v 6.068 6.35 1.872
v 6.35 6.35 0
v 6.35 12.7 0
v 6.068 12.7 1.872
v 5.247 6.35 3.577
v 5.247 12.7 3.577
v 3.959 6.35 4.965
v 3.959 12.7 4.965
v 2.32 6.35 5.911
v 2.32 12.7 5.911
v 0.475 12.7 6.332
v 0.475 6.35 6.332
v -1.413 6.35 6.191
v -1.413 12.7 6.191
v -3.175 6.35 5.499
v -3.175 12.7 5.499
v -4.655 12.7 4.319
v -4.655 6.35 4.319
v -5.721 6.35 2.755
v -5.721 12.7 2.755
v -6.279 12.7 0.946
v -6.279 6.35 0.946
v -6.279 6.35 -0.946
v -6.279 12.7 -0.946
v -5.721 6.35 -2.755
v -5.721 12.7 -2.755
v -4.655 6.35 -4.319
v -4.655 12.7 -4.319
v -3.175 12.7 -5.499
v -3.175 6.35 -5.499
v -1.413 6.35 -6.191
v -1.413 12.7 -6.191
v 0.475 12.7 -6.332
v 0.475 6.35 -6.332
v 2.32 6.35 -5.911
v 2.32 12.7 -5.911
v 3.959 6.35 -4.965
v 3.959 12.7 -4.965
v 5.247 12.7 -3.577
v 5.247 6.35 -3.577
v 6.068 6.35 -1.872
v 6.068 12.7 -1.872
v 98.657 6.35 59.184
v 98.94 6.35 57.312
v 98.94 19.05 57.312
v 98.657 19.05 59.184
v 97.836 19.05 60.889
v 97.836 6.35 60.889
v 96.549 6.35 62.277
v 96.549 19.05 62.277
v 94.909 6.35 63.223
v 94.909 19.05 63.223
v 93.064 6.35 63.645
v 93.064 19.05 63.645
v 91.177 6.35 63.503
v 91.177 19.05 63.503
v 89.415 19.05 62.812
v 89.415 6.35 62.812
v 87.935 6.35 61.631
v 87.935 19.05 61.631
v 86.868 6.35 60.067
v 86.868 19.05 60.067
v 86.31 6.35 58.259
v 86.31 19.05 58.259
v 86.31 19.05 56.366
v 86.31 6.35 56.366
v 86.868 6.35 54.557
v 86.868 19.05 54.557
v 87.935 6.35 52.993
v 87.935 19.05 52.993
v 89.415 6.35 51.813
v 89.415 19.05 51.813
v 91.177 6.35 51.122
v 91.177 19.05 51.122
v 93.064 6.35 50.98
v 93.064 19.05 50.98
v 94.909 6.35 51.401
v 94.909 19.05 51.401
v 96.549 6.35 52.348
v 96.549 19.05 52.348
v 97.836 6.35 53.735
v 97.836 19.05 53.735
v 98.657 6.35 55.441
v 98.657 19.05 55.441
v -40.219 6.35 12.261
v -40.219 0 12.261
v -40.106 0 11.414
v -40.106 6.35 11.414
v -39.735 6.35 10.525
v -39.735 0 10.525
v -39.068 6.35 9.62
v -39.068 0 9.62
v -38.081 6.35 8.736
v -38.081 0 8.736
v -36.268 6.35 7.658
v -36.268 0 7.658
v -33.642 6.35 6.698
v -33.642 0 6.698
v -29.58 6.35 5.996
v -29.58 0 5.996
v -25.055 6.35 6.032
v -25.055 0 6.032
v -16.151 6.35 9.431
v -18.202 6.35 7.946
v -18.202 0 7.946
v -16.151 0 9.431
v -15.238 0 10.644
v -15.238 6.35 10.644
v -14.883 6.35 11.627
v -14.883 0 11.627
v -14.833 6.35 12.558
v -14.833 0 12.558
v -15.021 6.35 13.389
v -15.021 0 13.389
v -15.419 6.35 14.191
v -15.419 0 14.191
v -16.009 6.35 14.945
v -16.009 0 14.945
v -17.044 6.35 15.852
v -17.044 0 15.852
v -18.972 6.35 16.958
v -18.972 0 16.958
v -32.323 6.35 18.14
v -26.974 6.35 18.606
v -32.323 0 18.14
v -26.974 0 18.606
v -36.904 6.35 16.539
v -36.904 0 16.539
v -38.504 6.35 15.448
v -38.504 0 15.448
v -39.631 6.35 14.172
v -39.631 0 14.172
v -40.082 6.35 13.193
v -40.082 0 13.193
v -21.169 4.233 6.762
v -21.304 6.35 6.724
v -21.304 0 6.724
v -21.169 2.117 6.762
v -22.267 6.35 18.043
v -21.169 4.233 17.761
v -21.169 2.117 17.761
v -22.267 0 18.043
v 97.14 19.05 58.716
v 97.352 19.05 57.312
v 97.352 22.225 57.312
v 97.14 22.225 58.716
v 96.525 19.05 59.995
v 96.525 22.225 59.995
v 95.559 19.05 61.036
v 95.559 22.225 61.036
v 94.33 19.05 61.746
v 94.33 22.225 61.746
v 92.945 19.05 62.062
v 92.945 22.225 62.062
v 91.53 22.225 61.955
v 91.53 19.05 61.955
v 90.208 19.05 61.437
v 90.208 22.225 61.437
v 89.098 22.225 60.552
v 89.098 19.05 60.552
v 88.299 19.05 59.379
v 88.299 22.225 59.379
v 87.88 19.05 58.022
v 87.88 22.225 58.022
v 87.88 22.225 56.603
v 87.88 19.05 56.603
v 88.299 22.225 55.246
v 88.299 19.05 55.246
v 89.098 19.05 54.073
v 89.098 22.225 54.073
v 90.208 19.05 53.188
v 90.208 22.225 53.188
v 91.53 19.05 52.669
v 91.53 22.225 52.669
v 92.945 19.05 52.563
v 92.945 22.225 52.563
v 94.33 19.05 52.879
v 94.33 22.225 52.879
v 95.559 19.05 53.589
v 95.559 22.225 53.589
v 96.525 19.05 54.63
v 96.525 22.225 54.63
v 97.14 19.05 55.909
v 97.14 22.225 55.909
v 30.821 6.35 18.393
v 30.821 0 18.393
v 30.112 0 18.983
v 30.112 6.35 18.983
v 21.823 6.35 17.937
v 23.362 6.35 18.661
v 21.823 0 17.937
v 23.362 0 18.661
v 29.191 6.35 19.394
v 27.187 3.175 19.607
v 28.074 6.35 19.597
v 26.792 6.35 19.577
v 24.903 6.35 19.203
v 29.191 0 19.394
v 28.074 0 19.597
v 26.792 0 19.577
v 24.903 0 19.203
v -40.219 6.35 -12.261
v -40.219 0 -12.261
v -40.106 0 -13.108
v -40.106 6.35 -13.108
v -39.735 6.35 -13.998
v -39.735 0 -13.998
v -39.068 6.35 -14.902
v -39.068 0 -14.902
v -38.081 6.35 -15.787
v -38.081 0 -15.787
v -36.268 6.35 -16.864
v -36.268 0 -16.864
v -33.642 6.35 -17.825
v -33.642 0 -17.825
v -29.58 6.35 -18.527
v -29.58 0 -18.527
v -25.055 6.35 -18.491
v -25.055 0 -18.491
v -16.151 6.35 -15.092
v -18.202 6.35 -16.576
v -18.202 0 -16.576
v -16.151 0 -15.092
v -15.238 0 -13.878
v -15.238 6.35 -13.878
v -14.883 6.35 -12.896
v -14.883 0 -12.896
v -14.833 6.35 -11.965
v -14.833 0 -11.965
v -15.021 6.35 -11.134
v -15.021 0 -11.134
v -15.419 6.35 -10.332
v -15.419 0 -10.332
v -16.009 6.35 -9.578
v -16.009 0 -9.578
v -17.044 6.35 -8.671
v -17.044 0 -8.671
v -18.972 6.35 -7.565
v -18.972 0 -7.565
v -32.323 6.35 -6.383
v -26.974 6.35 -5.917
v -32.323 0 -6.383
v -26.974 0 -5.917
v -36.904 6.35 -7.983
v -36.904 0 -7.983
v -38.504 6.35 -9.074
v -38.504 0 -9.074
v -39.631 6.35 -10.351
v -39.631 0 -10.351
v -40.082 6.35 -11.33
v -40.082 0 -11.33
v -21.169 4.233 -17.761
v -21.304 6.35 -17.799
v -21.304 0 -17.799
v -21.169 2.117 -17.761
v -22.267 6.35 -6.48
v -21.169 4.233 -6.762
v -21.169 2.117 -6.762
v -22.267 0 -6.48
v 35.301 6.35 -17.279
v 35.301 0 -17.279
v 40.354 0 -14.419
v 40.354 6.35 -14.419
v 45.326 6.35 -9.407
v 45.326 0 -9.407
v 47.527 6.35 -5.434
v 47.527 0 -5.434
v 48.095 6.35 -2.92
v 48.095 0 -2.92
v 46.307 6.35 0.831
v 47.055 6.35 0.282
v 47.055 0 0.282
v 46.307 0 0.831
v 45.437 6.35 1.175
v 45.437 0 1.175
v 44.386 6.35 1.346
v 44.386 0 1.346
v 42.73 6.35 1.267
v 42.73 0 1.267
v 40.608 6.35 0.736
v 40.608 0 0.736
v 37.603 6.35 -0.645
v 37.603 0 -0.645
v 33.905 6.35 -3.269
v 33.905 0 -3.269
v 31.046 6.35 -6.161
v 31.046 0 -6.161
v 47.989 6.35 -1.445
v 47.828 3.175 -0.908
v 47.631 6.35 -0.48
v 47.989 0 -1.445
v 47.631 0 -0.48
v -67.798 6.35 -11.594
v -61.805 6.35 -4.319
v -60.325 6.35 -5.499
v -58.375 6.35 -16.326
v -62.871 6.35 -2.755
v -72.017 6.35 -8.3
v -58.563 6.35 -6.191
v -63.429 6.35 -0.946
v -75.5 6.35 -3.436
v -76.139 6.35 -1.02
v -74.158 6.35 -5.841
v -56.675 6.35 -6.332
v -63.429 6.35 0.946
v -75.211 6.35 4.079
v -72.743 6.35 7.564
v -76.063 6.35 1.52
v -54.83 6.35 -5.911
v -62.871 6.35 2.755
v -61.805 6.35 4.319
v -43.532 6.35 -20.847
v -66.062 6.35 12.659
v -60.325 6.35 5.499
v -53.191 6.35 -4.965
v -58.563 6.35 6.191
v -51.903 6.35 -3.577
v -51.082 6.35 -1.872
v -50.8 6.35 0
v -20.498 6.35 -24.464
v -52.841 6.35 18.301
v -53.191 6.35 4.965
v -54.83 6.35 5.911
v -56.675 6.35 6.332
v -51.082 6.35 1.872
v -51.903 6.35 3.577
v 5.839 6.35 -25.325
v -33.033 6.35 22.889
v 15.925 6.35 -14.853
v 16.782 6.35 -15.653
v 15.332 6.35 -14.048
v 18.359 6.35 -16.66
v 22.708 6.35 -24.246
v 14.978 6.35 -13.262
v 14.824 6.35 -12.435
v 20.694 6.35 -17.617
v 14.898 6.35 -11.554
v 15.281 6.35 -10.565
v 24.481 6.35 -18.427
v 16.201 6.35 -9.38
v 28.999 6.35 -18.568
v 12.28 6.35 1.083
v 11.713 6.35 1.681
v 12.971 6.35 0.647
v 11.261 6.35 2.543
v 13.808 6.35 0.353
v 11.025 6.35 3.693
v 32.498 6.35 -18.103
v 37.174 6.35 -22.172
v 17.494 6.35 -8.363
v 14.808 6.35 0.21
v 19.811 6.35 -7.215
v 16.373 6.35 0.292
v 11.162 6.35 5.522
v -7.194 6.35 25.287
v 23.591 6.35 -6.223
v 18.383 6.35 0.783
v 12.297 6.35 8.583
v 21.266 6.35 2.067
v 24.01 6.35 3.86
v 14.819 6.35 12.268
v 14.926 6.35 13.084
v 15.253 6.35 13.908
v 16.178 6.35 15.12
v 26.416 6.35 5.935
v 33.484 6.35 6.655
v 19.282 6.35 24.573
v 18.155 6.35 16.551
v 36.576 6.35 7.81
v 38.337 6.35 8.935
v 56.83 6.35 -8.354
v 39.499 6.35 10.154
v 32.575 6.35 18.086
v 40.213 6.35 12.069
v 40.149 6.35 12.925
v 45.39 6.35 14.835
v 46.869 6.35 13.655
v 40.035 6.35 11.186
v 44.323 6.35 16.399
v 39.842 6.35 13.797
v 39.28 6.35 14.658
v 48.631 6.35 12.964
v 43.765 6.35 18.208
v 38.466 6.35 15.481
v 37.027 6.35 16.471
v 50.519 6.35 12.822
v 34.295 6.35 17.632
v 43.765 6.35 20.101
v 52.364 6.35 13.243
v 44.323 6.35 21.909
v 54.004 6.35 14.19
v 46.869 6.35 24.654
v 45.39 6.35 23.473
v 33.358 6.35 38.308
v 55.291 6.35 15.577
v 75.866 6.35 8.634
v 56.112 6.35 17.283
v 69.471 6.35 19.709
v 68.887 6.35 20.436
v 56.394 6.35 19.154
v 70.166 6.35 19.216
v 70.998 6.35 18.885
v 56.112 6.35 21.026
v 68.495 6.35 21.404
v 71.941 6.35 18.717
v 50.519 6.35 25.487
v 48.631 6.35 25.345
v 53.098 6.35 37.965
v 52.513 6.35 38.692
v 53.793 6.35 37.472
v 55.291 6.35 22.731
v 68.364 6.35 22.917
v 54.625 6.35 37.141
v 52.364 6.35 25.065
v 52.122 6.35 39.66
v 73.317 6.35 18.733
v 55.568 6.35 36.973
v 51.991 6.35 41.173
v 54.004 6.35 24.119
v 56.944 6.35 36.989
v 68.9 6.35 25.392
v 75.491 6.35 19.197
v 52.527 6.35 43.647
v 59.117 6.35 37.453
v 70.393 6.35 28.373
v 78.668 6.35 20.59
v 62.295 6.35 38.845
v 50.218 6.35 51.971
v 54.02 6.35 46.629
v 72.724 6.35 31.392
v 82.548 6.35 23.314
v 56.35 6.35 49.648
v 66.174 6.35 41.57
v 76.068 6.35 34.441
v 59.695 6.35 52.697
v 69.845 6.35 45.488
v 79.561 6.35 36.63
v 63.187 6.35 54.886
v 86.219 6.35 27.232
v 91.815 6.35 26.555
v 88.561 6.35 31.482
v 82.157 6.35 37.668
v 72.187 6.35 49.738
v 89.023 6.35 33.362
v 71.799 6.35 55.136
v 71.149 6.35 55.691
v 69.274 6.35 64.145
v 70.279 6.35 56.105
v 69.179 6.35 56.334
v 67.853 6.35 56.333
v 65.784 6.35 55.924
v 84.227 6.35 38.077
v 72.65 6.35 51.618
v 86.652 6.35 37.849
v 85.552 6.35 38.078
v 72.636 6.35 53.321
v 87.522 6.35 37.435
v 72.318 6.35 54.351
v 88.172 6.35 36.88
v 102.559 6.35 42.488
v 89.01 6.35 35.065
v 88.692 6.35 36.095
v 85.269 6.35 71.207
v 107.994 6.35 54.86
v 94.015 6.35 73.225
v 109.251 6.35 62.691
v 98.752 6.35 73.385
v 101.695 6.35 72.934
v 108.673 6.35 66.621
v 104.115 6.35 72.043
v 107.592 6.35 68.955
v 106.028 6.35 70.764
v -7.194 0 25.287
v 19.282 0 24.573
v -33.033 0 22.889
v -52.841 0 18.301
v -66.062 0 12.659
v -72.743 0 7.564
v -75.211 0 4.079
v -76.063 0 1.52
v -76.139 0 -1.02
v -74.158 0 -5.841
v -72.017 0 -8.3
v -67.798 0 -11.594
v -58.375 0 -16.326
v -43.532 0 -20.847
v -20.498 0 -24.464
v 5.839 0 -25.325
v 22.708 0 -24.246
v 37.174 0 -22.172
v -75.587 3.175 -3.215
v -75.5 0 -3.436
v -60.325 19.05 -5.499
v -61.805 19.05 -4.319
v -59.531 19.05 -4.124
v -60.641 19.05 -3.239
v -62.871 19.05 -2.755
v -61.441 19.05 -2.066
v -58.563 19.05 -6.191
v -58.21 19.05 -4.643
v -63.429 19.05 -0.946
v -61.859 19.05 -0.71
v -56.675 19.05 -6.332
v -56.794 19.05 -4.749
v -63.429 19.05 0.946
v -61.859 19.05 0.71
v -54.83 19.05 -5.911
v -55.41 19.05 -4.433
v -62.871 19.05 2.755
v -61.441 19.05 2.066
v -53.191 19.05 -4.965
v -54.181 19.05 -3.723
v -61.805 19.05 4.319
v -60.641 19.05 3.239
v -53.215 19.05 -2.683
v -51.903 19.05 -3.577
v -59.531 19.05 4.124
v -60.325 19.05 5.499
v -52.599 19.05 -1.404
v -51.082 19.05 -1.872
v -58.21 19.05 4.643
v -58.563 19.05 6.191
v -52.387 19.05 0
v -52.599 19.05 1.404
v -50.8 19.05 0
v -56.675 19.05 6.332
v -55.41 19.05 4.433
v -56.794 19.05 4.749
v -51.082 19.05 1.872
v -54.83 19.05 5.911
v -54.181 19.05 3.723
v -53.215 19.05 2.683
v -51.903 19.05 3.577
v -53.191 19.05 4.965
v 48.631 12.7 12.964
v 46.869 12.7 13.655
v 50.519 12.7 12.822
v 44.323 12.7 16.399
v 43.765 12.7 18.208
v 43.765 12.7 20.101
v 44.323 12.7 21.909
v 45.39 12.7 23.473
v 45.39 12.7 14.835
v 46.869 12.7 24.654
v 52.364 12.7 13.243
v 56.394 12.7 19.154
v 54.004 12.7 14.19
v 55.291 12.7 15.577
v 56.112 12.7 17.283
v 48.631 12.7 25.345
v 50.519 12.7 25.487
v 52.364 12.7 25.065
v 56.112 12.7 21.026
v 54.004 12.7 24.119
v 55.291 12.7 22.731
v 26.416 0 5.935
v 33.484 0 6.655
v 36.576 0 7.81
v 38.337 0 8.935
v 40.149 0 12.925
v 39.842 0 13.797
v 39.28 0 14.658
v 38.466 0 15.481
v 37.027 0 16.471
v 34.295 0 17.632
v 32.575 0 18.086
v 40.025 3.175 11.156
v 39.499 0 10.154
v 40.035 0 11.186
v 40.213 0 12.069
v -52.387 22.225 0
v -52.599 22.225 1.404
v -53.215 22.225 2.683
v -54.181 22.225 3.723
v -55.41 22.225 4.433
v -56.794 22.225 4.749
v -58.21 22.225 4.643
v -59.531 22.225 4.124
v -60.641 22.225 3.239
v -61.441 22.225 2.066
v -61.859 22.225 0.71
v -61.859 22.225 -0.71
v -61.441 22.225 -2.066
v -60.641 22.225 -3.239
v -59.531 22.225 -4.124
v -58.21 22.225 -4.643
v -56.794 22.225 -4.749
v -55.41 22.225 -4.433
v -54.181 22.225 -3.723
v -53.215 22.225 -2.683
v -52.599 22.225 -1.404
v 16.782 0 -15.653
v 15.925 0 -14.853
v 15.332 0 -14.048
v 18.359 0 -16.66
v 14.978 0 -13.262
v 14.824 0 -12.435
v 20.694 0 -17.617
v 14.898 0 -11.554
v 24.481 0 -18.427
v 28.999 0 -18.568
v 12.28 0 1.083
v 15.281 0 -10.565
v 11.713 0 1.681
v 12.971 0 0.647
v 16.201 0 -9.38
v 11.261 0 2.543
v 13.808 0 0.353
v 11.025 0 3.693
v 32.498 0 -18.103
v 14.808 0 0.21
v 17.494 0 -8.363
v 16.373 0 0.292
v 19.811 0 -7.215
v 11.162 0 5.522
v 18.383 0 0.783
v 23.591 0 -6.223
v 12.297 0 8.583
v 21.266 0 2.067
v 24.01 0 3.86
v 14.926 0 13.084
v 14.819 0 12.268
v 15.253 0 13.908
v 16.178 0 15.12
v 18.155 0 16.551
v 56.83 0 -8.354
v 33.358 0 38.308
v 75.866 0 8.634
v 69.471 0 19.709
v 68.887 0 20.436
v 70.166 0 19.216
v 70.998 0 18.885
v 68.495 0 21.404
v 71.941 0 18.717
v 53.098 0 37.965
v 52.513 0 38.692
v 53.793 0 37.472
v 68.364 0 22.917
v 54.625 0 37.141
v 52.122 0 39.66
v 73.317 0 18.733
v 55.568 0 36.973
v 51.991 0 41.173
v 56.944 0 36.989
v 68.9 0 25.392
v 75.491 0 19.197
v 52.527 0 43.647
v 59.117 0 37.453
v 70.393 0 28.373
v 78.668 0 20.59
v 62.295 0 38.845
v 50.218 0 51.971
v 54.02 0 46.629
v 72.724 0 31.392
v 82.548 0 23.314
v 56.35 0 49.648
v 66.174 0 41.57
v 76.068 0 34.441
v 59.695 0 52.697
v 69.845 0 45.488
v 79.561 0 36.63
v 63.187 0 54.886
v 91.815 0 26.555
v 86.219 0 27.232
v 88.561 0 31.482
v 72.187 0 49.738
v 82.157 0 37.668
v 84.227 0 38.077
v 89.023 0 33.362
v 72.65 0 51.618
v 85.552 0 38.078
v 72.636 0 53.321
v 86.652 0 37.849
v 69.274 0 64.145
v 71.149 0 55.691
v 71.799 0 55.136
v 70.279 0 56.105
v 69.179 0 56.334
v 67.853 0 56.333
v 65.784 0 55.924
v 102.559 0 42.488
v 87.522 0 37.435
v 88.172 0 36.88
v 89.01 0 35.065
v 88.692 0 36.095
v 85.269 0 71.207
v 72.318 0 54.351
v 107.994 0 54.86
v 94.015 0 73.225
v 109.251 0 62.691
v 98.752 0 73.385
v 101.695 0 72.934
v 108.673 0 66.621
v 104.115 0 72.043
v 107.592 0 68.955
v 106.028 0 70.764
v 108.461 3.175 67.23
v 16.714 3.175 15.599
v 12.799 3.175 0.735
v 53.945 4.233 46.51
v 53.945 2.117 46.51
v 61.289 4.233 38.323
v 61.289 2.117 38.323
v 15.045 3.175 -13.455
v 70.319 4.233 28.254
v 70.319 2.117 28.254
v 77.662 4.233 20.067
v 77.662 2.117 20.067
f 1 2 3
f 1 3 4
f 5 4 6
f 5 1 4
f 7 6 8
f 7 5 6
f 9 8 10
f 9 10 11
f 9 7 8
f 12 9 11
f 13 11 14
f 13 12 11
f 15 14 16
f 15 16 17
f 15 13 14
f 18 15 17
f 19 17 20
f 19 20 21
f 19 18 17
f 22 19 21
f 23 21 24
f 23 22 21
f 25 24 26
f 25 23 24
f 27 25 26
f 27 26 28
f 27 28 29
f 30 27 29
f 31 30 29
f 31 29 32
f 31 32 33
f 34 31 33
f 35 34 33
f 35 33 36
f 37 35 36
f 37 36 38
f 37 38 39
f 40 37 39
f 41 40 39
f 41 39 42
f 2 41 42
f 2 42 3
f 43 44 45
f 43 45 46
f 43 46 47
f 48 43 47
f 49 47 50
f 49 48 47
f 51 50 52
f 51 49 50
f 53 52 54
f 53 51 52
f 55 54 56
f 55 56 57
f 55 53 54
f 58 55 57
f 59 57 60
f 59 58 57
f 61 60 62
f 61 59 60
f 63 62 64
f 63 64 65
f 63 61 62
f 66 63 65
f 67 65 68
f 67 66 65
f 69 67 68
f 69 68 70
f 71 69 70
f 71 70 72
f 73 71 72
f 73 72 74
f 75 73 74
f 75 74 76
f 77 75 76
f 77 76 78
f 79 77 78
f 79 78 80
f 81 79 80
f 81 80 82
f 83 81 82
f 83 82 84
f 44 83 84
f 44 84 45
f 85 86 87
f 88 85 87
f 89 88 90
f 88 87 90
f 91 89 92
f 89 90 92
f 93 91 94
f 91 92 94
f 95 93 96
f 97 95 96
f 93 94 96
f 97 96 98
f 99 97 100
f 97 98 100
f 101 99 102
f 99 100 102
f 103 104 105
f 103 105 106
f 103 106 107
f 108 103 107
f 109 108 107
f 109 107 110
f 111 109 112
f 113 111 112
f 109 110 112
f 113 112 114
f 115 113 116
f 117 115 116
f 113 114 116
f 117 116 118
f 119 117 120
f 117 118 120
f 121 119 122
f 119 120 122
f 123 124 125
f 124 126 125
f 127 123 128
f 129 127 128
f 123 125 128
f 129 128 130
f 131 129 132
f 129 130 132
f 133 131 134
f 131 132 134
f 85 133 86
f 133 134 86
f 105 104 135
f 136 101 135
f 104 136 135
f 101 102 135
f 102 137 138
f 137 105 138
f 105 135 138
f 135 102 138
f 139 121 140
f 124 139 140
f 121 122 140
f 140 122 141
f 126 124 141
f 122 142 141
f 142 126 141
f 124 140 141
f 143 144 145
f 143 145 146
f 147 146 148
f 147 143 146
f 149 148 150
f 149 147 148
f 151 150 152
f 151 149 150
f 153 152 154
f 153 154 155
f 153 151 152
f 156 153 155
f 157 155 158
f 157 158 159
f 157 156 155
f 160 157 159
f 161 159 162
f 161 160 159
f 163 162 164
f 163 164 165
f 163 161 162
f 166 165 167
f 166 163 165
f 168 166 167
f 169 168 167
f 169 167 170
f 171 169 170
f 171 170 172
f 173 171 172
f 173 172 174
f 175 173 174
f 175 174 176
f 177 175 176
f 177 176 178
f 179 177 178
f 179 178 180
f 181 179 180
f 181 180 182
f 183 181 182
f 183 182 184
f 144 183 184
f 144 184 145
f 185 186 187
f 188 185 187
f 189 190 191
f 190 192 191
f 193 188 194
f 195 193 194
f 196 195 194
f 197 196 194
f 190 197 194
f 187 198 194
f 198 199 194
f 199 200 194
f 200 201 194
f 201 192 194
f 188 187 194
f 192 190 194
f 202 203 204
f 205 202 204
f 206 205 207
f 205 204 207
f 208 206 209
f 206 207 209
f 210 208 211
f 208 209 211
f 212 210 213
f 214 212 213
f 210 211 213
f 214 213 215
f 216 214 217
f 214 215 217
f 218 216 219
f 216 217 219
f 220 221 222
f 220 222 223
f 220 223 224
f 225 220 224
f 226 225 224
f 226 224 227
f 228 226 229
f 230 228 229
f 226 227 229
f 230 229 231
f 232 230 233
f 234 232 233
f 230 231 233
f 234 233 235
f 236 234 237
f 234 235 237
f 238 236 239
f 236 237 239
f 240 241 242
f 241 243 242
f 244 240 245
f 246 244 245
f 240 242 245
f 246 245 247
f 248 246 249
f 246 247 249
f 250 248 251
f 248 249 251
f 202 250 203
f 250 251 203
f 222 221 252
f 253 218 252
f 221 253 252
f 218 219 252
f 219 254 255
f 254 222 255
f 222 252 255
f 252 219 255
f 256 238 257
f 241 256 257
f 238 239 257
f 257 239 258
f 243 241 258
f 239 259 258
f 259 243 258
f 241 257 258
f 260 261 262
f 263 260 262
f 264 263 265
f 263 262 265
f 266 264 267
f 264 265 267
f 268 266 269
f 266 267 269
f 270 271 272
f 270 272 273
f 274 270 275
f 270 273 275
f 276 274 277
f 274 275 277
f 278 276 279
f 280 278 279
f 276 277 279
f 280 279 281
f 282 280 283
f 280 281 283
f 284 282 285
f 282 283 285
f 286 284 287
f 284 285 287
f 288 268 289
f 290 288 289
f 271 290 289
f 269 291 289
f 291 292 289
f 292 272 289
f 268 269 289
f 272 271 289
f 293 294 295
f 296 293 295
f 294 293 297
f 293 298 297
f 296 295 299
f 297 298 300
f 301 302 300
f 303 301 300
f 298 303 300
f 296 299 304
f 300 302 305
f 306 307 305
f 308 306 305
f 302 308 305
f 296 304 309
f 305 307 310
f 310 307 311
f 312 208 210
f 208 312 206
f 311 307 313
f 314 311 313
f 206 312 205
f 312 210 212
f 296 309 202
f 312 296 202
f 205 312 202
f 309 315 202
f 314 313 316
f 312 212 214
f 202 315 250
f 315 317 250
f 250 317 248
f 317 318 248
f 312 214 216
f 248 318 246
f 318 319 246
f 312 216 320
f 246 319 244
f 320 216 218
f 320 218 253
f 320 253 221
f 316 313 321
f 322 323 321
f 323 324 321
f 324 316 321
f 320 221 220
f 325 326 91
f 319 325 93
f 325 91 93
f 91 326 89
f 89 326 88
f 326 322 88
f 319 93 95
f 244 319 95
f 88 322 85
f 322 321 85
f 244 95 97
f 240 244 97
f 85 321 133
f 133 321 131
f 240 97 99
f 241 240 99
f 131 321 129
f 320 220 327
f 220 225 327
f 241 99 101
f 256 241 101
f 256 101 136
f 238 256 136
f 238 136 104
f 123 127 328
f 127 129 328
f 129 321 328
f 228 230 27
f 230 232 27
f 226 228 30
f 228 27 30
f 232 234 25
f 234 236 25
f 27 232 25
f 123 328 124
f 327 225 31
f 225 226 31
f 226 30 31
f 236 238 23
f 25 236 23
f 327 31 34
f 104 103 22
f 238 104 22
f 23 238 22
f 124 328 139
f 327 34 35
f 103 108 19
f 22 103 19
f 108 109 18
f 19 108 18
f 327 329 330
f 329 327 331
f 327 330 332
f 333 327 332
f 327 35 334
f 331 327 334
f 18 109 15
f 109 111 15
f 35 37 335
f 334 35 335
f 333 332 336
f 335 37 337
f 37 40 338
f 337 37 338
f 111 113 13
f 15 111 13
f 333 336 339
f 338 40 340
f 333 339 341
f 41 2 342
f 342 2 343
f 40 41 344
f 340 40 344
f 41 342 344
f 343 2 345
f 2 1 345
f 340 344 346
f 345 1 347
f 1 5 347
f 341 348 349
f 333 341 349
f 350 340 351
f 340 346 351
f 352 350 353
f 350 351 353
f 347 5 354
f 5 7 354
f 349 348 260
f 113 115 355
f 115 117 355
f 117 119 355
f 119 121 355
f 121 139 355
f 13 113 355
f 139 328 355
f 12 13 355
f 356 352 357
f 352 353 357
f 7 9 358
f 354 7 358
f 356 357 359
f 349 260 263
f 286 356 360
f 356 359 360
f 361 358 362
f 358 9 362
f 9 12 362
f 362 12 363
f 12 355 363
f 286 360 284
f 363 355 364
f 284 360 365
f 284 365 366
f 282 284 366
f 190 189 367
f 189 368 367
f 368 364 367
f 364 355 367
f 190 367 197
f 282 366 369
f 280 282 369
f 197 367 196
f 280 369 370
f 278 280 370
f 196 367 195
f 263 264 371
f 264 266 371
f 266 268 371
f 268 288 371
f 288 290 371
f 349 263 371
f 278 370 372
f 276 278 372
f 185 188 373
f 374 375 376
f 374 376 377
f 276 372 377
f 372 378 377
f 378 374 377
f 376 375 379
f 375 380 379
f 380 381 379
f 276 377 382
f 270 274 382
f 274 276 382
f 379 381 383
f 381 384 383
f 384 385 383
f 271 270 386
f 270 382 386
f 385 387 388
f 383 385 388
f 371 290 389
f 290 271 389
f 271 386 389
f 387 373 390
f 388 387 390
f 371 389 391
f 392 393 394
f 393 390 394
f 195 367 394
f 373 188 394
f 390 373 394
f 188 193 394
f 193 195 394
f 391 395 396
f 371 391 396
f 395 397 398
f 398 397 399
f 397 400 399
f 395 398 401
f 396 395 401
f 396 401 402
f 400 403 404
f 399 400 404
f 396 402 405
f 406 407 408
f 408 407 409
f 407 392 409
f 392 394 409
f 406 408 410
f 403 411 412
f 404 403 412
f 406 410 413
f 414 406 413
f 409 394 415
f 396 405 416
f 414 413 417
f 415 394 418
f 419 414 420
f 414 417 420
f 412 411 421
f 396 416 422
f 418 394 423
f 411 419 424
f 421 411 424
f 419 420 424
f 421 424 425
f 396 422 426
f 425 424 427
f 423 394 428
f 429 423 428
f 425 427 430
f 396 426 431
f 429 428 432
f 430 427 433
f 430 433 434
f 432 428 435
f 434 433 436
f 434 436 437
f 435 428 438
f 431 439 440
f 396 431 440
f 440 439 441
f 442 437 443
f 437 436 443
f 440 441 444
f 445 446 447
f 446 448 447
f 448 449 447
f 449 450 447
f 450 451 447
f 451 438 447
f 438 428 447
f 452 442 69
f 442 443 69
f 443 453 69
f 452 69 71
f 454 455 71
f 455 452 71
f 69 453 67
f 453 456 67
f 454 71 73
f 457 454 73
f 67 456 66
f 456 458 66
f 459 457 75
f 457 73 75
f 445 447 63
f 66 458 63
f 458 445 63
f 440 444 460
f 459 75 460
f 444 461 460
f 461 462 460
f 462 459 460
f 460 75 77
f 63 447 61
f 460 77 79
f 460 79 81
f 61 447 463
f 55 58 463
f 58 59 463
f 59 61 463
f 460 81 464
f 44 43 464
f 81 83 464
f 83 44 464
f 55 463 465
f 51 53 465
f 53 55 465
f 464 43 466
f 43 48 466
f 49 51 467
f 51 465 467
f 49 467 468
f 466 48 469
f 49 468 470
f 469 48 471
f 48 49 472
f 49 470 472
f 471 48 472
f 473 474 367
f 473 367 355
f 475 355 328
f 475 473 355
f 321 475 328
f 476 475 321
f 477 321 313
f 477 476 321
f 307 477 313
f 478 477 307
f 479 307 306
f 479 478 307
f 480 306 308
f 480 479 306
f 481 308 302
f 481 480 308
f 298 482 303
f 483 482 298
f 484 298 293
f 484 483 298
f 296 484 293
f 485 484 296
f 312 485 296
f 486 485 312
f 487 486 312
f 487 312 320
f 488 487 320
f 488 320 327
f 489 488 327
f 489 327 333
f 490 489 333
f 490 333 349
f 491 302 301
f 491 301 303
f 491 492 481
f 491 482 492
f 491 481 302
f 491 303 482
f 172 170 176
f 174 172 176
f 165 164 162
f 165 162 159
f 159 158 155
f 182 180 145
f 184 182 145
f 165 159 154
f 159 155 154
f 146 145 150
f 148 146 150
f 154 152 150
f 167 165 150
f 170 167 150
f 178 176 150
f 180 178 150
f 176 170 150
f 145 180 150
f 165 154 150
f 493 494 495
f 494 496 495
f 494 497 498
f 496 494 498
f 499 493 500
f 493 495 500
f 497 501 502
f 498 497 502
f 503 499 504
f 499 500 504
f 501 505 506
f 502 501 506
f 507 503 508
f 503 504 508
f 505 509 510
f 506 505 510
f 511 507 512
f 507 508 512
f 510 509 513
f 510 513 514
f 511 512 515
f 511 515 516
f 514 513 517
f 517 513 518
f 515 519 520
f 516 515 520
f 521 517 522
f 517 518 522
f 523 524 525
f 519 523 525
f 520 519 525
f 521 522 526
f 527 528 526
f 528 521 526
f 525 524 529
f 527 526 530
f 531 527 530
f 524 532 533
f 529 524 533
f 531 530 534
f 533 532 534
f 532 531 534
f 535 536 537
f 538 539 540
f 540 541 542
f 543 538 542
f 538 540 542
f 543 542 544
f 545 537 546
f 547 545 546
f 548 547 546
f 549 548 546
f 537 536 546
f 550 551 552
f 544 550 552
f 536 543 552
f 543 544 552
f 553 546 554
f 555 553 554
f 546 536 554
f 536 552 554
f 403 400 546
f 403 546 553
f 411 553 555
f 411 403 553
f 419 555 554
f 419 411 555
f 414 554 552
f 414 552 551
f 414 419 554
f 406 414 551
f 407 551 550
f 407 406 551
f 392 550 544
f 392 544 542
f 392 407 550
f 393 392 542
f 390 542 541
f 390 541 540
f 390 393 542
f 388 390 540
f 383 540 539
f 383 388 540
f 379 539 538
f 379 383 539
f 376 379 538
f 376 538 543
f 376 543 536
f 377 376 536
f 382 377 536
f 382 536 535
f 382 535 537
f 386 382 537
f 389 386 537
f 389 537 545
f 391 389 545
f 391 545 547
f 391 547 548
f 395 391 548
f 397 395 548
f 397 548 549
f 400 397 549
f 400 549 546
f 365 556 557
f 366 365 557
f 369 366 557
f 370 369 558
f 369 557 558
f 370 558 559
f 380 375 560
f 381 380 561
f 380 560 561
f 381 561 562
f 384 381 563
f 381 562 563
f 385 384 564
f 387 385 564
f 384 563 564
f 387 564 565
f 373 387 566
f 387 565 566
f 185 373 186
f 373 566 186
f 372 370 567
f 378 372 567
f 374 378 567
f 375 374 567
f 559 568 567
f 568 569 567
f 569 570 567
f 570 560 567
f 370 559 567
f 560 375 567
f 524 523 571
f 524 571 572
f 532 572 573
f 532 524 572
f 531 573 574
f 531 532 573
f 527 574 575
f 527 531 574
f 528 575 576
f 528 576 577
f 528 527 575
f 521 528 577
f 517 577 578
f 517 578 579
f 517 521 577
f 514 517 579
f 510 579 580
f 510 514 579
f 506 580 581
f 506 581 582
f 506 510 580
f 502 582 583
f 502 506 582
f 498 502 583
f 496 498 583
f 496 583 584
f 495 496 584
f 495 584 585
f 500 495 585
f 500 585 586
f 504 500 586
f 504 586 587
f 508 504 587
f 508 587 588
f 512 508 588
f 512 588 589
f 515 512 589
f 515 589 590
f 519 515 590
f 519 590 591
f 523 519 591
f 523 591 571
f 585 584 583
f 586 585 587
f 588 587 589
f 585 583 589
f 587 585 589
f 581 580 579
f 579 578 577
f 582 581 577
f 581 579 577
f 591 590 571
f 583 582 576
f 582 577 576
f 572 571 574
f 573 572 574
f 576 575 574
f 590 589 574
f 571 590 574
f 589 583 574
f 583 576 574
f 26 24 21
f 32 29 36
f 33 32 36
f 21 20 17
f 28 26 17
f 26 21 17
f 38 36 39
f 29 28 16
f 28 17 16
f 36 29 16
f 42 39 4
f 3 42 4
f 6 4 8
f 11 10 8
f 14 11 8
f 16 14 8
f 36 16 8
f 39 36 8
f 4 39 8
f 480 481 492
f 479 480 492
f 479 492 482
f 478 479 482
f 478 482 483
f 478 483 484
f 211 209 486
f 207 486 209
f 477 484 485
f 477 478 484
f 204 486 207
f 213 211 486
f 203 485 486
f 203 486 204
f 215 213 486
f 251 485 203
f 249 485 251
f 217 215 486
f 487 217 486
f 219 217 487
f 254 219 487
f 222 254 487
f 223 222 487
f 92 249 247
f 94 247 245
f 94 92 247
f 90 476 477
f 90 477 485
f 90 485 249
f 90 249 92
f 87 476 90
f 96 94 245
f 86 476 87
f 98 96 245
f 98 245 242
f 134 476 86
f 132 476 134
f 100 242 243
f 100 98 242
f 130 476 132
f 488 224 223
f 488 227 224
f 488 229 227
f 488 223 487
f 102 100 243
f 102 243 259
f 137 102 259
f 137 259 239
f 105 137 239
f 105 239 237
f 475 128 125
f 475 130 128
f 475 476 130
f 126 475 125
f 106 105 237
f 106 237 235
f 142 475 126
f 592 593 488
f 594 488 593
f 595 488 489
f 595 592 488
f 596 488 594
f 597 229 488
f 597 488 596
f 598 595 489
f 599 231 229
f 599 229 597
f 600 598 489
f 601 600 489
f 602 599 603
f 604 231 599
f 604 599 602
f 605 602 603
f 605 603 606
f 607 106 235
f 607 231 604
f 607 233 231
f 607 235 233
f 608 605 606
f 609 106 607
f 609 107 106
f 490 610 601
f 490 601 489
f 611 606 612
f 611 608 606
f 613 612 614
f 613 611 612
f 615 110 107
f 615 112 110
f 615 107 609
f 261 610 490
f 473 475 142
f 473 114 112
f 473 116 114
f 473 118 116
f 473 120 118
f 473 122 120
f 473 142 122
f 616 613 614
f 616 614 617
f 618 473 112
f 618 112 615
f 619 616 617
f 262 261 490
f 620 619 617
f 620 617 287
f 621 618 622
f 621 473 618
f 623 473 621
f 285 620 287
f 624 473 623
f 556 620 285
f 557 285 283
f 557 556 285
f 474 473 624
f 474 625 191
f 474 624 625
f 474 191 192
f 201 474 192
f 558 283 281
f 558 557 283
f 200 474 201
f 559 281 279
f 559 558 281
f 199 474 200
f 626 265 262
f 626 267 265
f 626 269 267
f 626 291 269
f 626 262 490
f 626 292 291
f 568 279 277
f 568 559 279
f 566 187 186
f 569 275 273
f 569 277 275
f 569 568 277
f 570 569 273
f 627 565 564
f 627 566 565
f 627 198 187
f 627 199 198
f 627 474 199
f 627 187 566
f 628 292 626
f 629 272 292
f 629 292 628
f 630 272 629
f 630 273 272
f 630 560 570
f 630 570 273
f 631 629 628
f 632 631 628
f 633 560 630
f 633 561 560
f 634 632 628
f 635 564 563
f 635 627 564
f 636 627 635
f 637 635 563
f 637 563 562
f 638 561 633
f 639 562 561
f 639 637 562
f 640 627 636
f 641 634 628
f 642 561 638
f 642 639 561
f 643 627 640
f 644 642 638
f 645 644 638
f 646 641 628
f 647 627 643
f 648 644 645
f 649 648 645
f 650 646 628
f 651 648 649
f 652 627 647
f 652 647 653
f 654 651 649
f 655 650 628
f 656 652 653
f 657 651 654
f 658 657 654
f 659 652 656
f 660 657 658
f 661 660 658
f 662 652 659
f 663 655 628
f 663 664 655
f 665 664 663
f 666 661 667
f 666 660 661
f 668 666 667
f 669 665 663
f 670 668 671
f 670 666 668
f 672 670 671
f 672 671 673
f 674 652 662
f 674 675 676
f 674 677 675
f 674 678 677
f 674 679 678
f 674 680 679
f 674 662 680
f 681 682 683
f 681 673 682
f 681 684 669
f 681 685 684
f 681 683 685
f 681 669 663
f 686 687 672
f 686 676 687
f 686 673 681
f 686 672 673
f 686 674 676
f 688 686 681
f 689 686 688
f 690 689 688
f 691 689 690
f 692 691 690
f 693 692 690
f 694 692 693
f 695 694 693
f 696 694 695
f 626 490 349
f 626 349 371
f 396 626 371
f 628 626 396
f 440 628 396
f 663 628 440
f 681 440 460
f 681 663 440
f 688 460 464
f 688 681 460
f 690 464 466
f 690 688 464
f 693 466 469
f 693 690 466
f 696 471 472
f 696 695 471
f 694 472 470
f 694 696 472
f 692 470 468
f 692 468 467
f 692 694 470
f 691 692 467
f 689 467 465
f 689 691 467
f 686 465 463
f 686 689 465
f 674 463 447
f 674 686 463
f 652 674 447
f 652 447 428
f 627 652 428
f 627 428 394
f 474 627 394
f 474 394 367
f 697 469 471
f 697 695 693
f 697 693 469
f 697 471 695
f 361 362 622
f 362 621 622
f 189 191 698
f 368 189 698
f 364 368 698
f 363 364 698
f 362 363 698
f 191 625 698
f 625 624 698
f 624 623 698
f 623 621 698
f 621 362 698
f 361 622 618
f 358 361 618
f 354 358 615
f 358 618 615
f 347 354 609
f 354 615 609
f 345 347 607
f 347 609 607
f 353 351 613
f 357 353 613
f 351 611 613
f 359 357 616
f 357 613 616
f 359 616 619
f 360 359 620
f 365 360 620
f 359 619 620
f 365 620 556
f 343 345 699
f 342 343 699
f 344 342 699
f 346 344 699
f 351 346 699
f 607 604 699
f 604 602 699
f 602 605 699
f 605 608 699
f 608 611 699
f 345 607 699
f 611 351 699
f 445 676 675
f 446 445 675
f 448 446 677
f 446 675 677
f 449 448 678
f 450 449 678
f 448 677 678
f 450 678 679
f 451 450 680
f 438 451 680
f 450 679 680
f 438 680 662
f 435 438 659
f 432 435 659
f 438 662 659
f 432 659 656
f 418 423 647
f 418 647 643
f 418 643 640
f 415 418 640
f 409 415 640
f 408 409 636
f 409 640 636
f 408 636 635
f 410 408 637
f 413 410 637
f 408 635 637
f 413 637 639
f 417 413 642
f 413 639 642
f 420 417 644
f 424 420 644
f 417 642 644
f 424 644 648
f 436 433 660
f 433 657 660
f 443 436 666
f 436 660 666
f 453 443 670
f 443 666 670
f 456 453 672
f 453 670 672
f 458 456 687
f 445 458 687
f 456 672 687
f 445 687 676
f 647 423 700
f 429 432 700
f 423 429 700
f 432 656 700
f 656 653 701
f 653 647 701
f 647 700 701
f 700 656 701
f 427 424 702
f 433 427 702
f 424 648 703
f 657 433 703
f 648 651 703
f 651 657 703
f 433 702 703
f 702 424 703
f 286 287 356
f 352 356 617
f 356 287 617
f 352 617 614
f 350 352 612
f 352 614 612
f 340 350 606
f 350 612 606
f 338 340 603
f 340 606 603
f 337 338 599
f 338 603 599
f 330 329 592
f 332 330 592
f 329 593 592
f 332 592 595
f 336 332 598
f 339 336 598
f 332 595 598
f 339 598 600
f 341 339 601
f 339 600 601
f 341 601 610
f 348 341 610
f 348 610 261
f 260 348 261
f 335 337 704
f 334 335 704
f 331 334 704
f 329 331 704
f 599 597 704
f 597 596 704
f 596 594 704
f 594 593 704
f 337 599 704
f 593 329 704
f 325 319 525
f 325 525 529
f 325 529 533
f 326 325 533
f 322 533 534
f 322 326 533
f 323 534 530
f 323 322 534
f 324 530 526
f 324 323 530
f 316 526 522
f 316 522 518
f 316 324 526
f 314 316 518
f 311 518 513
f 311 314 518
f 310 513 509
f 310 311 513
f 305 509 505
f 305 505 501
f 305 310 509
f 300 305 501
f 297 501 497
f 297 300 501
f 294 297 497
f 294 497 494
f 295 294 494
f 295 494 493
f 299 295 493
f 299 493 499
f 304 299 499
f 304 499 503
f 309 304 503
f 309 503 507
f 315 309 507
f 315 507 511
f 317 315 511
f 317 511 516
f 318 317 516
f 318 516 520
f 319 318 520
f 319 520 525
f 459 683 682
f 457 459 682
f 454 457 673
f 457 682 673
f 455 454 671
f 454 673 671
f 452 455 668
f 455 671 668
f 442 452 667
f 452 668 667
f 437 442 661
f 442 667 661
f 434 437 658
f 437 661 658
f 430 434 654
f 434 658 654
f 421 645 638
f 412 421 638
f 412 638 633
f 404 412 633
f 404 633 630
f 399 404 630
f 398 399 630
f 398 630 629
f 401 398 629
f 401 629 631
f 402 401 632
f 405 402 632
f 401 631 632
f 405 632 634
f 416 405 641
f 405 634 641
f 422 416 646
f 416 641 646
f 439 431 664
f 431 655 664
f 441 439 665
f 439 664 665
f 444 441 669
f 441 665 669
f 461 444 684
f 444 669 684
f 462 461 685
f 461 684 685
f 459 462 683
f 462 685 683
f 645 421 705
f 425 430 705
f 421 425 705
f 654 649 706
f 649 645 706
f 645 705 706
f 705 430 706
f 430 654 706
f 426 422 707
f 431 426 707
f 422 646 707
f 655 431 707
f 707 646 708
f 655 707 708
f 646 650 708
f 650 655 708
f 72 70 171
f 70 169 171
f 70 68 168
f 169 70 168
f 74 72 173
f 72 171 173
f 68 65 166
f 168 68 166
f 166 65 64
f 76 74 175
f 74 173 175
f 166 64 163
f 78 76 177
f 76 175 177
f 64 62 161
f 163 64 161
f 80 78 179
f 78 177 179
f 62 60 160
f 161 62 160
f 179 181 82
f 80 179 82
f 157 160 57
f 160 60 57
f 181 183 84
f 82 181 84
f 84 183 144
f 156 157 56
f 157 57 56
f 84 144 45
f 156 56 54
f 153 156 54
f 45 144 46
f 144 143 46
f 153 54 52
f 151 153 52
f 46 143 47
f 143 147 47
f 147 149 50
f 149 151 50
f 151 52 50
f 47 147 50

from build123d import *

# Parameters (mm, degrees)
F0_R     = 6.35
F1_DEPTH = 6.35
F0_R_2   = 4.7625
F2_DEPTH = 19.05
F3_DEPTH = 19.05
F4_DEPTH = 12.7
F5_DEPTH = 12.7
F6_DEPTH = 22.225
F7_DEPTH = 22.225


with BuildPart() as f1:
    # F0 (on Front) → F1 (new body)
    with BuildSketch(Plane.XZ):
        with BuildLine():
            add(Edge.make_bspline(
                [(37.1742285347, -22.1723469736), (122.739519111, 29.9253006643), (108.4614492154, 67.2295257241), (94.1833793198, 104.5337507839), (19.2824834585, 24.5733049188)],
                knots=[1.0611703705, 1.0611703705, 1.0611703705, 3.0146959581, 3.0146959581, 4.9682215457, 4.9682215457, 4.9682215457], degree=2, weights=[1, 0.5597081146, 1, 0.5597081146, 1]))
            add(Edge.make_bspline(
                [(19.2824834585, 24.5733049188), (-89.8653771413, 34.0896923766), (-75.5873072457, -3.2145326832), (-61.3092373501, -40.518757743), (37.1742285347, -22.1723469736)],
                knots=[1.3149637615, 1.3149637615, 1.3149637615, 3.2684893491, 3.2684893491, 5.2220149367, 5.2220149367, 5.2220149367], degree=2, weights=[1, 0.5597081146, 1, 0.5597081146, 1]))
        make_face()
        with BuildLine():
            add(Edge.make_bspline(
                [(-40.2189802051, -12.2613835424), (-40.2189802051, -23.2599061705), (-21.1689802051, -17.7606448564), (-2.1189802051, -12.2613835424), (-21.1689802051, -6.7621222284), (-40.2189802051, -1.2628609144), (-40.2189802051, -12.2613835424)],
                knots=[0, 0, 0, 2.0943951024, 2.0943951024, 4.1887902048, 4.1887902048, 6.2831853072, 6.2831853072, 6.2831853072], degree=2, weights=[1, 0.5, 1, 0.5, 1, 0.5, 1]))
        make_face(mode=Mode.SUBTRACT)
        with Locations((-57.15, 0)):
            Circle(F0_R, mode=Mode.SUBTRACT)
        Circle(F0_R, mode=Mode.SUBTRACT)
        with BuildLine():
            add(Edge.make_bspline(
                [(-40.2189802051, 12.2613835424), (-40.2189802051, 1.2628609144), (-21.1689802051, 6.7621222284), (-2.1189802051, 12.2613835424), (-21.1689802051, 17.7606448564), (-40.2189802051, 23.2599061705), (-40.2189802051, 12.2613835424)],
                knots=[0, 0, 0, 2.0943951024, 2.0943951024, 4.1887902048, 4.1887902048, 6.2831853072, 6.2831853072, 6.2831853072], degree=2, weights=[1, 0.5, 1, 0.5, 1, 0.5, 1]))
        make_face(mode=Mode.SUBTRACT)
        with BuildLine():
            add(Edge.make_bspline(
                [(31.0460055984, -6.1611767452), (11.1531172526, -3.285752818), (15.0453420721, -13.4549445722), (18.9375668916, -23.6241363265), (35.3014766673, -17.2794197324)],
                knots=[1.2893779229, 1.2893779229, 1.2893779229, 3.3306797762, 3.3306797762, 5.3719816294, 5.3719816294, 5.3719816294], degree=2, weights=[1, 0.5228111806, 1, 0.5228111806, 1]))
            add(Edge.make_bspline(
                [(35.3014766673, -17.2794197324), (51.7197916302, -11.0768472352), (47.8275668108, -0.9076554809), (43.9353419913, 9.2615362733), (31.0460055984, -6.1611767452)],
                knots=[0.9112036777, 0.9112036777, 0.9112036777, 2.952505531, 2.952505531, 4.9938073843, 4.9938073843, 4.9938073843], degree=2, weights=[1, 0.5228111806, 1, 0.5228111806, 1]))
        make_face(mode=Mode.SUBTRACT)
        with BuildLine():
            add(Edge.make_bspline(
                [(26.4160908045, 5.9353730506), (38.0004613393, 5.4304624323), (40.0250130574, 11.155813294), (42.0495647755, 16.8811641557), (30.8212418268, 18.3929630327)],
                knots=[4.6254377708, 4.6254377708, 4.6254377708, 6.108187934, 6.108187934, 7.5909380972, 7.5909380972, 7.5909380972], degree=2, weights=[1, 0.73754066, 1, 0.73754066, 1]))
            add(Edge.make_bspline(
                [(14.8189874208, 12.2681525982), (7.4694947115, 3.6457556577), (12.7993768112, 0.7352902393), (18.1292589109, -2.1751751792), (26.4160908045, 5.9353730506)],
                knots=[4.9754325172, 4.9754325172, 4.9754325172, 6.4581826804, 6.4581826804, 7.9409328436, 7.9409328436, 7.9409328436], degree=2, weights=[1, 0.73754066, 1, 0.73754066, 1]))
            add(Edge.make_bspline(
                [(21.8225865676, 17.9367932089), (14.827330656, 16.1815132551), (14.8189874208, 12.2681525982)],
                knots=[2.0359217815, 2.0359217815, 2.0359217815, 3.1405266603, 3.1405266603, 3.1405266603], degree=2, weights=[1, 0.8513188077, 1]))
            add(Edge.make_bspline(
                [(30.8212418268, 18.3929630327), (28.2021525278, 21.3006824972), (21.8225865676, 17.9367932089)],
                knots=[3.1426586468, 3.1426586468, 3.1426586468, 4.2472635256, 4.2472635256, 4.2472635256], degree=2, weights=[1, 0.8513188077, 1]))
        make_face(mode=Mode.SUBTRACT)
        with Locations((50.0444119496, 19.154334678)):
            Circle(F0_R, mode=Mode.SUBTRACT)
        with BuildLine():
            add(Edge.make_bspline(
                [(71.7986181301, 55.1357522232), (64.4551089206, 63.3235707661), (53.945145806, 46.510330438), (43.4351826914, 29.6970901099), (61.2886550155, 38.3225118952), (79.1421273396, 46.9479336804), (71.7986181301, 55.1357522232)],
                knots=[0, 0, 0, 2.0943951024, 2.0943951024, 4.1887902048, 4.1887902048, 6.2831853072, 6.2831853072, 6.2831853072], degree=2, weights=[1, 0.5, 1, 0.5, 1, 0.5, 1]))
        make_face(mode=Mode.SUBTRACT)
        with BuildLine():
            add(Edge.make_bspline(
                [(88.1720140869, 36.8798487852), (80.8285048775, 45.0676673281), (70.3185417629, 28.254427), (59.8085786482, 11.4411866719), (77.6620509723, 20.0666084571), (95.5155232964, 28.6920302424), (88.1720140869, 36.8798487852)],
                knots=[0, 0, 0, 2.0943951024, 2.0943951024, 4.1887902048, 4.1887902048, 6.2831853072, 6.2831853072, 6.2831853072], degree=2, weights=[1, 0.5, 1, 0.5, 1, 0.5, 1]))
        make_face(mode=Mode.SUBTRACT)
        with Locations((92.5895651076, 57.312327848)):
            Circle(F0_R, mode=Mode.SUBTRACT)
    extrude(amount=-F1_DEPTH)

    # F0 (on Front) → F2 (join)
    with BuildSketch(Plane.XZ):
        with Locations((-57.15, 0)):
            Circle(F0_R)
        with Locations((-57.15, 0)):
            Circle(F0_R_2, mode=Mode.SUBTRACT)
    extrude(amount=-F2_DEPTH)

    # F0 (on Front) → F3 (join)
    with BuildSketch(Plane.XZ):
        with Locations((92.5895651076, 57.312327848)):
            Circle(F0_R)
        with Locations((92.5895651076, 57.312327848)):
            Circle(F0_R_2, mode=Mode.SUBTRACT)
    extrude(amount=-F3_DEPTH)

    # F0 (on Front) → F4 (join)
    with BuildSketch(Plane.XZ):
        Circle(F0_R)
    extrude(amount=-F4_DEPTH)

    # F0 (on Front) → F5 (join)
    with BuildSketch(Plane.XZ):
        with Locations((50.0444119496, 19.154334678)):
            Circle(F0_R)
    extrude(amount=-F5_DEPTH)

    # F0 (on Front) → F6 (join)
    with BuildSketch(Plane.XZ):
        with Locations((92.5895651076, 57.312327848)):
            Circle(F0_R_2)
    extrude(amount=-F6_DEPTH)

    # F0 (on Front) → F7 (join)
    with BuildSketch(Plane.XZ):
        with Locations((-57.15, 0)):
            Circle(F0_R_2)
    extrude(amount=-F7_DEPTH)


solid = f1.part
